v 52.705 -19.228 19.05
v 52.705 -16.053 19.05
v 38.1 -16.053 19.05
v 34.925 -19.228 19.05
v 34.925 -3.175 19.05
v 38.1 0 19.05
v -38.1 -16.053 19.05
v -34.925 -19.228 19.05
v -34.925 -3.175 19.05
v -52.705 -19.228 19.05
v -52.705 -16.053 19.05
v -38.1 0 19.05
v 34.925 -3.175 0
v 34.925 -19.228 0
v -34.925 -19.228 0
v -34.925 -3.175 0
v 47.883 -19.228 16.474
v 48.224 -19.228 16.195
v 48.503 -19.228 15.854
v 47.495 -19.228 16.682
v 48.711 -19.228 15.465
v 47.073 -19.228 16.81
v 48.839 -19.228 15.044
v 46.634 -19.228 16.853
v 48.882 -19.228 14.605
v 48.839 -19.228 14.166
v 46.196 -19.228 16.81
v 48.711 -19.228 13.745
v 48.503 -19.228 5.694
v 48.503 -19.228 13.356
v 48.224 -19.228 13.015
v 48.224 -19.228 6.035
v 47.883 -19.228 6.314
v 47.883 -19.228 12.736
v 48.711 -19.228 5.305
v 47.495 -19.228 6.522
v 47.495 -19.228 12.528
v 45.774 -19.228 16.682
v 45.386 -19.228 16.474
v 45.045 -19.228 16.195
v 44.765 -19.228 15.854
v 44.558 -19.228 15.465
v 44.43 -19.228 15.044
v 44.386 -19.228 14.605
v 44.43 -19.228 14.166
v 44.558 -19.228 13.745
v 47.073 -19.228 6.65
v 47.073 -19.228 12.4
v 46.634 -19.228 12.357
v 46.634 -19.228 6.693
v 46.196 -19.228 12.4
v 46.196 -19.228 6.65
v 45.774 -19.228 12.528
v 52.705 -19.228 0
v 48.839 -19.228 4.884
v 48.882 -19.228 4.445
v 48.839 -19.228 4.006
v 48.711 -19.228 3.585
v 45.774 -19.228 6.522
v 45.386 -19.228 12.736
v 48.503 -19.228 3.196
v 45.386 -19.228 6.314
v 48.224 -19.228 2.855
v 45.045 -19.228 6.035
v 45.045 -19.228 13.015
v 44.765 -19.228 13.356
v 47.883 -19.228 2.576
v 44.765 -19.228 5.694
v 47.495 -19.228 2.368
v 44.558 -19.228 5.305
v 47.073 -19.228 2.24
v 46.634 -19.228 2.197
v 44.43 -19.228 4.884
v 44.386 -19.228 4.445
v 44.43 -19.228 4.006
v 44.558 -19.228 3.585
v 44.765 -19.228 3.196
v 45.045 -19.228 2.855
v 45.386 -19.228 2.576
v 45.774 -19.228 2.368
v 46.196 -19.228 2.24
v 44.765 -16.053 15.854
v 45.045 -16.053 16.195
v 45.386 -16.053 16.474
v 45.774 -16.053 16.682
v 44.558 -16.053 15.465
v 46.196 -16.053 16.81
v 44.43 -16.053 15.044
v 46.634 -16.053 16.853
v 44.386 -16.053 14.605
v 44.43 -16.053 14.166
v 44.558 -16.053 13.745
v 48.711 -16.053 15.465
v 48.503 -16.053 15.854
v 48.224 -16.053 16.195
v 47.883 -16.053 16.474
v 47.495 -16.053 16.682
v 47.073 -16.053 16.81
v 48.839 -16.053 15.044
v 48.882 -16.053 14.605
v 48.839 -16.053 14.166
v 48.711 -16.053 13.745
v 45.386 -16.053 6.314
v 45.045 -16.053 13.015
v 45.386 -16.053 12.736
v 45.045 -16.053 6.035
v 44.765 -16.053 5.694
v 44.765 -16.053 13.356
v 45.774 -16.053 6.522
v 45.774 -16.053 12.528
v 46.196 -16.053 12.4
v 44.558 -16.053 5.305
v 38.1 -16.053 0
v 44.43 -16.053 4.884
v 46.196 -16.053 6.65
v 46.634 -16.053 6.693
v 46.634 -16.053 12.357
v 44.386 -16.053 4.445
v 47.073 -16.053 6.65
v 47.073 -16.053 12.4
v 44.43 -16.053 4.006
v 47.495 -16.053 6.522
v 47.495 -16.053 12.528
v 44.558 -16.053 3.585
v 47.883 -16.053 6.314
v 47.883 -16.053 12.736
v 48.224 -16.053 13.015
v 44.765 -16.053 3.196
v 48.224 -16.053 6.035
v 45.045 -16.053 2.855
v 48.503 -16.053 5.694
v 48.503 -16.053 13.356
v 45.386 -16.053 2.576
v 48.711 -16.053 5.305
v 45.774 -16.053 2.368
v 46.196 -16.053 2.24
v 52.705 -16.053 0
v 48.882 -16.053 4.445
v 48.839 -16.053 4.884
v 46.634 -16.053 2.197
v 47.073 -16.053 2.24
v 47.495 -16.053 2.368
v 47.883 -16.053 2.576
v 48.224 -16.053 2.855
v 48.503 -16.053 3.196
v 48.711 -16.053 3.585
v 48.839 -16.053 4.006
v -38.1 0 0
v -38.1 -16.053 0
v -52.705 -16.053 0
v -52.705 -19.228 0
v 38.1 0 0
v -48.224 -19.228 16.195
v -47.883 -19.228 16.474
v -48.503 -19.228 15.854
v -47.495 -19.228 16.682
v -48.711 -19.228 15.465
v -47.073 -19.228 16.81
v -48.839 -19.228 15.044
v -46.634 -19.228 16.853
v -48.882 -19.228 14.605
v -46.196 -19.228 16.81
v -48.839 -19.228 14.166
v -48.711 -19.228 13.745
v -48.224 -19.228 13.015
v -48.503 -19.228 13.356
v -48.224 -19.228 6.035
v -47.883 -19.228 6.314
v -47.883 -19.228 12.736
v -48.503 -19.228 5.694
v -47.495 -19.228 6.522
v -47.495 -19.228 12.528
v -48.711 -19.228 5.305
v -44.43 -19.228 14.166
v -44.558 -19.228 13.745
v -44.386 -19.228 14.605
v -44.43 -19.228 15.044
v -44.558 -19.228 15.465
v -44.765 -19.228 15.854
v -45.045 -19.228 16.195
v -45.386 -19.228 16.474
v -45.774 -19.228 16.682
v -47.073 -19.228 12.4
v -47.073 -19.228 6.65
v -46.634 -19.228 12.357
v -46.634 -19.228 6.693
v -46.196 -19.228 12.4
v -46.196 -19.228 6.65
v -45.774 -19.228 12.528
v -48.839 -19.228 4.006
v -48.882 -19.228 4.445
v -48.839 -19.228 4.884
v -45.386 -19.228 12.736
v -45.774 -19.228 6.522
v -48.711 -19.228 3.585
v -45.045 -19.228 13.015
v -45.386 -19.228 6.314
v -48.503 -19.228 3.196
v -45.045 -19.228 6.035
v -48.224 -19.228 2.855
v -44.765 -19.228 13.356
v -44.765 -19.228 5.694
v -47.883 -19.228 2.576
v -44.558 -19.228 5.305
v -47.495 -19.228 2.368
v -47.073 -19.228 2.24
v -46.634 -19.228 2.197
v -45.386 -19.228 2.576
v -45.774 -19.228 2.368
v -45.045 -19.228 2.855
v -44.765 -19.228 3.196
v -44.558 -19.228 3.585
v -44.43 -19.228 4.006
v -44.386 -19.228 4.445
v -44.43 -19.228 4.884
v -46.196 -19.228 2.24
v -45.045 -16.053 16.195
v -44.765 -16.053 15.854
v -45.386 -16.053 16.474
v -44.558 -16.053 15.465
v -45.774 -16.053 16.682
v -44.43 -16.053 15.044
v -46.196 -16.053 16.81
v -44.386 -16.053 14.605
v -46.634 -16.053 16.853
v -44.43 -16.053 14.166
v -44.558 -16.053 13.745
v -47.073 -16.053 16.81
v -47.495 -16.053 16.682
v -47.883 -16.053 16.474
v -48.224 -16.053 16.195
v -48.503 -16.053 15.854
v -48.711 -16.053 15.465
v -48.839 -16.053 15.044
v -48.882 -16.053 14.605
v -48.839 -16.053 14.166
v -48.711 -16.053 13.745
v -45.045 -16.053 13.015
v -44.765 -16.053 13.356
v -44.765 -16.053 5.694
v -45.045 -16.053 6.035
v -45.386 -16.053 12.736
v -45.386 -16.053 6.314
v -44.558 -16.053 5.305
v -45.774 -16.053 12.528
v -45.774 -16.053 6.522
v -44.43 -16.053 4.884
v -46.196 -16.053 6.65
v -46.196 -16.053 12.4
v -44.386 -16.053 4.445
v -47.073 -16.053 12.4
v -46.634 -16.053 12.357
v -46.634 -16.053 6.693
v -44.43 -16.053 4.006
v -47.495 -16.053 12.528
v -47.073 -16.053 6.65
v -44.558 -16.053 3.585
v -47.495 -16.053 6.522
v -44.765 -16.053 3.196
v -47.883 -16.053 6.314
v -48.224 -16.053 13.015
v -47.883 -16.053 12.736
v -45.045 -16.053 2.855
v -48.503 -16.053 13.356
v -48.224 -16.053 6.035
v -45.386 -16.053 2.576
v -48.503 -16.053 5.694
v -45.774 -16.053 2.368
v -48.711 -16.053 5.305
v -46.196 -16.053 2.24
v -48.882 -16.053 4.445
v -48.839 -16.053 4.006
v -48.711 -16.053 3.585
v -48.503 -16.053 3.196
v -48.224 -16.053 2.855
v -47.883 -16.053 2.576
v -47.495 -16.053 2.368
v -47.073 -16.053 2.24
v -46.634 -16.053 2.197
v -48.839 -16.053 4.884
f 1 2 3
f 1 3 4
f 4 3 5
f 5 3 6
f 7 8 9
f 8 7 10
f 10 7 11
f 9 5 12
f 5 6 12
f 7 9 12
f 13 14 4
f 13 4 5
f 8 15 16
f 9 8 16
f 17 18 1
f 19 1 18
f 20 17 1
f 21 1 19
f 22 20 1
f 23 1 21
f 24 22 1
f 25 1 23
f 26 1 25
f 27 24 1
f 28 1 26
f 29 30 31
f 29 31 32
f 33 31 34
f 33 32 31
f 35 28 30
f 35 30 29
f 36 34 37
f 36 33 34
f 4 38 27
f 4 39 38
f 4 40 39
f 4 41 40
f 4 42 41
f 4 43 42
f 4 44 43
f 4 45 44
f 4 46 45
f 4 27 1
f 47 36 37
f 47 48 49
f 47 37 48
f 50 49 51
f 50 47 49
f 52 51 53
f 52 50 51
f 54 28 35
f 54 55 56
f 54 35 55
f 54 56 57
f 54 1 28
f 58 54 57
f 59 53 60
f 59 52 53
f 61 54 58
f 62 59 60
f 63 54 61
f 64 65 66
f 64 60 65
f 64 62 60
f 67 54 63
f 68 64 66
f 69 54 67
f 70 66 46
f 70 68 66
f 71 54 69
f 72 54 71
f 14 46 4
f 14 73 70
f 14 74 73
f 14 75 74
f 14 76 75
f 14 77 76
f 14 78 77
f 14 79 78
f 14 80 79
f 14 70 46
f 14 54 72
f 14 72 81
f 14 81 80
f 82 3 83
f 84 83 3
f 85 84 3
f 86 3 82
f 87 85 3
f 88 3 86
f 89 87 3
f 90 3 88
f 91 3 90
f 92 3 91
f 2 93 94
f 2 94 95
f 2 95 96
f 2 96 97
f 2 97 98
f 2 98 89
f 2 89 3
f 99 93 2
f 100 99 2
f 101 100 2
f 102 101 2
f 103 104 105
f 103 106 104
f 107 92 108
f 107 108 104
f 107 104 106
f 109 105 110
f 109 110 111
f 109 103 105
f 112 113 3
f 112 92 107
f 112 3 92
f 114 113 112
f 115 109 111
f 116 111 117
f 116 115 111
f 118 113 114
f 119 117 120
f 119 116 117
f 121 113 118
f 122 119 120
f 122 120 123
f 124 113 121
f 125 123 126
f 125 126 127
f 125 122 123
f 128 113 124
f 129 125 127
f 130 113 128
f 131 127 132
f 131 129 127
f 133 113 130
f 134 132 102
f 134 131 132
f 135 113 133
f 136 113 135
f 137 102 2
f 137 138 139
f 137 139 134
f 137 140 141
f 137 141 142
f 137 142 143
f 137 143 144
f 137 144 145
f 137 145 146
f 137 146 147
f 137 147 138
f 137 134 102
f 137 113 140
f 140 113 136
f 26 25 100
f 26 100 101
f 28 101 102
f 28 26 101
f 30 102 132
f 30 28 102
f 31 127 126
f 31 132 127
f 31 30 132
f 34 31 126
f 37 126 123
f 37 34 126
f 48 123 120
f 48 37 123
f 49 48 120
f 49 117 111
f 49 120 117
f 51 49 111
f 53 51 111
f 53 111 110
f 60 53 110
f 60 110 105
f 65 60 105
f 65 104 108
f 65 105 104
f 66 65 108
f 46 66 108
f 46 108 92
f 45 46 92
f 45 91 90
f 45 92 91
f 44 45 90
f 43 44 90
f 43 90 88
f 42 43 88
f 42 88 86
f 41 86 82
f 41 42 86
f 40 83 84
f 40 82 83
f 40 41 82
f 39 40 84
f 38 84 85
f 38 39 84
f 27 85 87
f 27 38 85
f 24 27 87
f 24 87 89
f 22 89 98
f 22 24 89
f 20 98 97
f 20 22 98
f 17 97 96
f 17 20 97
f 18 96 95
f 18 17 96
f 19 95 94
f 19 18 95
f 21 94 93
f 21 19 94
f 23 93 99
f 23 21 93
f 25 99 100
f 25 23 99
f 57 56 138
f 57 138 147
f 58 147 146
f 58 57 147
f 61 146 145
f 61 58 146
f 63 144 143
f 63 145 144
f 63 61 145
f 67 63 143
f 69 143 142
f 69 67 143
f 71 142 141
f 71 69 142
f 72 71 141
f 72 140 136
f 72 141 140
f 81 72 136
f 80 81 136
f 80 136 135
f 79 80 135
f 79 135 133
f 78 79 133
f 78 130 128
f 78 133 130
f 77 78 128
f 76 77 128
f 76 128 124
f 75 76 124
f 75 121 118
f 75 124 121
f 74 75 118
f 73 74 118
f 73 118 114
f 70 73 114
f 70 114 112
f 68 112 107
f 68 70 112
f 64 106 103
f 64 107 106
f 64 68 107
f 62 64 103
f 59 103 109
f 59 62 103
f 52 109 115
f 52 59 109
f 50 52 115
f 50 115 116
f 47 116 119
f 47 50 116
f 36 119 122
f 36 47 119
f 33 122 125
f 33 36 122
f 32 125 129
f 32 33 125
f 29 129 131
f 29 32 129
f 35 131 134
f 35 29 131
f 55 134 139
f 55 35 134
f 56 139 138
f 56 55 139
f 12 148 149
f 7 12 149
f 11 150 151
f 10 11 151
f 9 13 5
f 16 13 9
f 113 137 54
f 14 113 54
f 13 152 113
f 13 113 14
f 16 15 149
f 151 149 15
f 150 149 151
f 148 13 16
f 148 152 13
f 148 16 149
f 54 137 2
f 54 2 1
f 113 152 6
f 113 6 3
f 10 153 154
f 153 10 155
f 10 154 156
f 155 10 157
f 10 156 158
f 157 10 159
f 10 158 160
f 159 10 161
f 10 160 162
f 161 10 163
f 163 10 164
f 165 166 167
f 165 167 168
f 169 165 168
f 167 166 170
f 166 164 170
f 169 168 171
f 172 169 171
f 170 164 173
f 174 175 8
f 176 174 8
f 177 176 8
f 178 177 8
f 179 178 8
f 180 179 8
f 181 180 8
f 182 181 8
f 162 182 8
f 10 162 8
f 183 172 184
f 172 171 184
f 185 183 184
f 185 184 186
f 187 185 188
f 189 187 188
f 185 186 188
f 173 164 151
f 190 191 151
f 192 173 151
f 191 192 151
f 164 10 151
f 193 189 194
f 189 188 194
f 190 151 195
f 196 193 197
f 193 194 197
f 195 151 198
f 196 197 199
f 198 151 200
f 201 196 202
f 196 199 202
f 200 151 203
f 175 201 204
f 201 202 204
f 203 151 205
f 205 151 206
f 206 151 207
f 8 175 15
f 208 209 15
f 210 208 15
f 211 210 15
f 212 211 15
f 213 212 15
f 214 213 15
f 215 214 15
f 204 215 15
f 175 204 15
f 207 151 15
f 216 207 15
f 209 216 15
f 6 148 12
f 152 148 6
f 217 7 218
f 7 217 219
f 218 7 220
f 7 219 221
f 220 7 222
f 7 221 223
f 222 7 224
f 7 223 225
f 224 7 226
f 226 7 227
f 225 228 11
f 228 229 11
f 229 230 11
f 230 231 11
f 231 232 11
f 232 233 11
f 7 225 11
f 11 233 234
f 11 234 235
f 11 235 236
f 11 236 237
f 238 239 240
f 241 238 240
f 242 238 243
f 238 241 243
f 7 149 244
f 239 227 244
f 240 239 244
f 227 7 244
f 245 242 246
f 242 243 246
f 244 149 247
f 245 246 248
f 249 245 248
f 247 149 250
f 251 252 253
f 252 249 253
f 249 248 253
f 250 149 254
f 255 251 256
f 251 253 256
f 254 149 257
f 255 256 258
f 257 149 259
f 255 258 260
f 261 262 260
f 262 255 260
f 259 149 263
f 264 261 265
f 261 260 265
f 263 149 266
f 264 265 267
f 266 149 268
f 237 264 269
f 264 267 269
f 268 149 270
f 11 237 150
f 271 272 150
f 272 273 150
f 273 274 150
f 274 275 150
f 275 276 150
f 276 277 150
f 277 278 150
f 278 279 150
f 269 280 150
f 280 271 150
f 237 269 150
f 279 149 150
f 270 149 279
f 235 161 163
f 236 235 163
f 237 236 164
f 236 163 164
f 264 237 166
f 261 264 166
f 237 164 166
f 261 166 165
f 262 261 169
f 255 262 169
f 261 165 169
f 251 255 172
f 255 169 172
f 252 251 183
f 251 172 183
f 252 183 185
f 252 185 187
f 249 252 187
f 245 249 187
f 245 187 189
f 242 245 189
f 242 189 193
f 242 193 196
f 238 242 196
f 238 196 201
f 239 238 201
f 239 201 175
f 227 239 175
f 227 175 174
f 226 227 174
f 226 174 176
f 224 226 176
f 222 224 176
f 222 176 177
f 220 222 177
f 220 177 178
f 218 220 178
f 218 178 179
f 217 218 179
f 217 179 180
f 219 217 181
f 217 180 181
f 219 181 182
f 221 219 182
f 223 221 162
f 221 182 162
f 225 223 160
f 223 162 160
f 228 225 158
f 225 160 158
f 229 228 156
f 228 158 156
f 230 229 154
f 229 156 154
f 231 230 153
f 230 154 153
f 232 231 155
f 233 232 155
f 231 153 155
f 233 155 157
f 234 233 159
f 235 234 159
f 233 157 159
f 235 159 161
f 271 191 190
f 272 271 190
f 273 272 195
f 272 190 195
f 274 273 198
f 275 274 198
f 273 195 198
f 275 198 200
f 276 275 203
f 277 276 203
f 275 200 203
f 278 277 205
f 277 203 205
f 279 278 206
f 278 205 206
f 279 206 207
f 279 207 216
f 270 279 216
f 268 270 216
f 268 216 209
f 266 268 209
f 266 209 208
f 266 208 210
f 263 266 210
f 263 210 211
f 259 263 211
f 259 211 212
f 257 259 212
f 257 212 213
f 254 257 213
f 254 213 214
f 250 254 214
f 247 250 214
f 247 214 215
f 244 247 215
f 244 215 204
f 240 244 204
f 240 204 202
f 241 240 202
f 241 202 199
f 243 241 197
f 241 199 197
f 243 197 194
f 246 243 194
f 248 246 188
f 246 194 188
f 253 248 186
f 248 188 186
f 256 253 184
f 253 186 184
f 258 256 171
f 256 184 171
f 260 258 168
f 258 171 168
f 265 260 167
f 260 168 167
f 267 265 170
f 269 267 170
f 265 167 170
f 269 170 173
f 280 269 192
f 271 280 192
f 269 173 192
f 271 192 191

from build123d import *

# Parameters (mm, degrees)
EXTRUDE1_DEPTH        = 19.05
F_8_CLEARANCE_HOLE1_D = 4.4958


with BuildPart() as part:
    # Sketch1 → Extrude1 (new body)
    with BuildSketch(Plane.XY):
        Polygon((0, 0), (-38.1, 0), (-38.1, -16.0528), (-52.705, -16.0528), (-52.705, -19.2278), (-34.925, -19.2278), (-34.925, -3.175), (0, -3.175), align=None)
    extrude1 = extrude(amount=EXTRUDE1_DEPTH)

    # #8 Clearance Hole1 (through all)
    with Locations(Plane(origin=(-46.6344, -16.0528, 4.445), x_dir=(1, 0, 0), z_dir=(0, 1, 0))):
        with Locations((0, 0), (0, -10.16)):
            f_8_clearance_hole1 = Hole(F_8_CLEARANCE_HOLE1_D / 2)

    # Mirror1: Extrude1, #8 Clearance Hole1 across plane
    add(extrude1.mirror(Plane(origin=(0, 0, 0), x_dir=(0, 0, 1), z_dir=(1, 0, 0))))
    add(f_8_clearance_hole1.mirror(Plane(origin=(0, 0, 0), x_dir=(0, 0, 1), z_dir=(1, 0, 0))), mode=Mode.SUBTRACT)


solid = part.part
